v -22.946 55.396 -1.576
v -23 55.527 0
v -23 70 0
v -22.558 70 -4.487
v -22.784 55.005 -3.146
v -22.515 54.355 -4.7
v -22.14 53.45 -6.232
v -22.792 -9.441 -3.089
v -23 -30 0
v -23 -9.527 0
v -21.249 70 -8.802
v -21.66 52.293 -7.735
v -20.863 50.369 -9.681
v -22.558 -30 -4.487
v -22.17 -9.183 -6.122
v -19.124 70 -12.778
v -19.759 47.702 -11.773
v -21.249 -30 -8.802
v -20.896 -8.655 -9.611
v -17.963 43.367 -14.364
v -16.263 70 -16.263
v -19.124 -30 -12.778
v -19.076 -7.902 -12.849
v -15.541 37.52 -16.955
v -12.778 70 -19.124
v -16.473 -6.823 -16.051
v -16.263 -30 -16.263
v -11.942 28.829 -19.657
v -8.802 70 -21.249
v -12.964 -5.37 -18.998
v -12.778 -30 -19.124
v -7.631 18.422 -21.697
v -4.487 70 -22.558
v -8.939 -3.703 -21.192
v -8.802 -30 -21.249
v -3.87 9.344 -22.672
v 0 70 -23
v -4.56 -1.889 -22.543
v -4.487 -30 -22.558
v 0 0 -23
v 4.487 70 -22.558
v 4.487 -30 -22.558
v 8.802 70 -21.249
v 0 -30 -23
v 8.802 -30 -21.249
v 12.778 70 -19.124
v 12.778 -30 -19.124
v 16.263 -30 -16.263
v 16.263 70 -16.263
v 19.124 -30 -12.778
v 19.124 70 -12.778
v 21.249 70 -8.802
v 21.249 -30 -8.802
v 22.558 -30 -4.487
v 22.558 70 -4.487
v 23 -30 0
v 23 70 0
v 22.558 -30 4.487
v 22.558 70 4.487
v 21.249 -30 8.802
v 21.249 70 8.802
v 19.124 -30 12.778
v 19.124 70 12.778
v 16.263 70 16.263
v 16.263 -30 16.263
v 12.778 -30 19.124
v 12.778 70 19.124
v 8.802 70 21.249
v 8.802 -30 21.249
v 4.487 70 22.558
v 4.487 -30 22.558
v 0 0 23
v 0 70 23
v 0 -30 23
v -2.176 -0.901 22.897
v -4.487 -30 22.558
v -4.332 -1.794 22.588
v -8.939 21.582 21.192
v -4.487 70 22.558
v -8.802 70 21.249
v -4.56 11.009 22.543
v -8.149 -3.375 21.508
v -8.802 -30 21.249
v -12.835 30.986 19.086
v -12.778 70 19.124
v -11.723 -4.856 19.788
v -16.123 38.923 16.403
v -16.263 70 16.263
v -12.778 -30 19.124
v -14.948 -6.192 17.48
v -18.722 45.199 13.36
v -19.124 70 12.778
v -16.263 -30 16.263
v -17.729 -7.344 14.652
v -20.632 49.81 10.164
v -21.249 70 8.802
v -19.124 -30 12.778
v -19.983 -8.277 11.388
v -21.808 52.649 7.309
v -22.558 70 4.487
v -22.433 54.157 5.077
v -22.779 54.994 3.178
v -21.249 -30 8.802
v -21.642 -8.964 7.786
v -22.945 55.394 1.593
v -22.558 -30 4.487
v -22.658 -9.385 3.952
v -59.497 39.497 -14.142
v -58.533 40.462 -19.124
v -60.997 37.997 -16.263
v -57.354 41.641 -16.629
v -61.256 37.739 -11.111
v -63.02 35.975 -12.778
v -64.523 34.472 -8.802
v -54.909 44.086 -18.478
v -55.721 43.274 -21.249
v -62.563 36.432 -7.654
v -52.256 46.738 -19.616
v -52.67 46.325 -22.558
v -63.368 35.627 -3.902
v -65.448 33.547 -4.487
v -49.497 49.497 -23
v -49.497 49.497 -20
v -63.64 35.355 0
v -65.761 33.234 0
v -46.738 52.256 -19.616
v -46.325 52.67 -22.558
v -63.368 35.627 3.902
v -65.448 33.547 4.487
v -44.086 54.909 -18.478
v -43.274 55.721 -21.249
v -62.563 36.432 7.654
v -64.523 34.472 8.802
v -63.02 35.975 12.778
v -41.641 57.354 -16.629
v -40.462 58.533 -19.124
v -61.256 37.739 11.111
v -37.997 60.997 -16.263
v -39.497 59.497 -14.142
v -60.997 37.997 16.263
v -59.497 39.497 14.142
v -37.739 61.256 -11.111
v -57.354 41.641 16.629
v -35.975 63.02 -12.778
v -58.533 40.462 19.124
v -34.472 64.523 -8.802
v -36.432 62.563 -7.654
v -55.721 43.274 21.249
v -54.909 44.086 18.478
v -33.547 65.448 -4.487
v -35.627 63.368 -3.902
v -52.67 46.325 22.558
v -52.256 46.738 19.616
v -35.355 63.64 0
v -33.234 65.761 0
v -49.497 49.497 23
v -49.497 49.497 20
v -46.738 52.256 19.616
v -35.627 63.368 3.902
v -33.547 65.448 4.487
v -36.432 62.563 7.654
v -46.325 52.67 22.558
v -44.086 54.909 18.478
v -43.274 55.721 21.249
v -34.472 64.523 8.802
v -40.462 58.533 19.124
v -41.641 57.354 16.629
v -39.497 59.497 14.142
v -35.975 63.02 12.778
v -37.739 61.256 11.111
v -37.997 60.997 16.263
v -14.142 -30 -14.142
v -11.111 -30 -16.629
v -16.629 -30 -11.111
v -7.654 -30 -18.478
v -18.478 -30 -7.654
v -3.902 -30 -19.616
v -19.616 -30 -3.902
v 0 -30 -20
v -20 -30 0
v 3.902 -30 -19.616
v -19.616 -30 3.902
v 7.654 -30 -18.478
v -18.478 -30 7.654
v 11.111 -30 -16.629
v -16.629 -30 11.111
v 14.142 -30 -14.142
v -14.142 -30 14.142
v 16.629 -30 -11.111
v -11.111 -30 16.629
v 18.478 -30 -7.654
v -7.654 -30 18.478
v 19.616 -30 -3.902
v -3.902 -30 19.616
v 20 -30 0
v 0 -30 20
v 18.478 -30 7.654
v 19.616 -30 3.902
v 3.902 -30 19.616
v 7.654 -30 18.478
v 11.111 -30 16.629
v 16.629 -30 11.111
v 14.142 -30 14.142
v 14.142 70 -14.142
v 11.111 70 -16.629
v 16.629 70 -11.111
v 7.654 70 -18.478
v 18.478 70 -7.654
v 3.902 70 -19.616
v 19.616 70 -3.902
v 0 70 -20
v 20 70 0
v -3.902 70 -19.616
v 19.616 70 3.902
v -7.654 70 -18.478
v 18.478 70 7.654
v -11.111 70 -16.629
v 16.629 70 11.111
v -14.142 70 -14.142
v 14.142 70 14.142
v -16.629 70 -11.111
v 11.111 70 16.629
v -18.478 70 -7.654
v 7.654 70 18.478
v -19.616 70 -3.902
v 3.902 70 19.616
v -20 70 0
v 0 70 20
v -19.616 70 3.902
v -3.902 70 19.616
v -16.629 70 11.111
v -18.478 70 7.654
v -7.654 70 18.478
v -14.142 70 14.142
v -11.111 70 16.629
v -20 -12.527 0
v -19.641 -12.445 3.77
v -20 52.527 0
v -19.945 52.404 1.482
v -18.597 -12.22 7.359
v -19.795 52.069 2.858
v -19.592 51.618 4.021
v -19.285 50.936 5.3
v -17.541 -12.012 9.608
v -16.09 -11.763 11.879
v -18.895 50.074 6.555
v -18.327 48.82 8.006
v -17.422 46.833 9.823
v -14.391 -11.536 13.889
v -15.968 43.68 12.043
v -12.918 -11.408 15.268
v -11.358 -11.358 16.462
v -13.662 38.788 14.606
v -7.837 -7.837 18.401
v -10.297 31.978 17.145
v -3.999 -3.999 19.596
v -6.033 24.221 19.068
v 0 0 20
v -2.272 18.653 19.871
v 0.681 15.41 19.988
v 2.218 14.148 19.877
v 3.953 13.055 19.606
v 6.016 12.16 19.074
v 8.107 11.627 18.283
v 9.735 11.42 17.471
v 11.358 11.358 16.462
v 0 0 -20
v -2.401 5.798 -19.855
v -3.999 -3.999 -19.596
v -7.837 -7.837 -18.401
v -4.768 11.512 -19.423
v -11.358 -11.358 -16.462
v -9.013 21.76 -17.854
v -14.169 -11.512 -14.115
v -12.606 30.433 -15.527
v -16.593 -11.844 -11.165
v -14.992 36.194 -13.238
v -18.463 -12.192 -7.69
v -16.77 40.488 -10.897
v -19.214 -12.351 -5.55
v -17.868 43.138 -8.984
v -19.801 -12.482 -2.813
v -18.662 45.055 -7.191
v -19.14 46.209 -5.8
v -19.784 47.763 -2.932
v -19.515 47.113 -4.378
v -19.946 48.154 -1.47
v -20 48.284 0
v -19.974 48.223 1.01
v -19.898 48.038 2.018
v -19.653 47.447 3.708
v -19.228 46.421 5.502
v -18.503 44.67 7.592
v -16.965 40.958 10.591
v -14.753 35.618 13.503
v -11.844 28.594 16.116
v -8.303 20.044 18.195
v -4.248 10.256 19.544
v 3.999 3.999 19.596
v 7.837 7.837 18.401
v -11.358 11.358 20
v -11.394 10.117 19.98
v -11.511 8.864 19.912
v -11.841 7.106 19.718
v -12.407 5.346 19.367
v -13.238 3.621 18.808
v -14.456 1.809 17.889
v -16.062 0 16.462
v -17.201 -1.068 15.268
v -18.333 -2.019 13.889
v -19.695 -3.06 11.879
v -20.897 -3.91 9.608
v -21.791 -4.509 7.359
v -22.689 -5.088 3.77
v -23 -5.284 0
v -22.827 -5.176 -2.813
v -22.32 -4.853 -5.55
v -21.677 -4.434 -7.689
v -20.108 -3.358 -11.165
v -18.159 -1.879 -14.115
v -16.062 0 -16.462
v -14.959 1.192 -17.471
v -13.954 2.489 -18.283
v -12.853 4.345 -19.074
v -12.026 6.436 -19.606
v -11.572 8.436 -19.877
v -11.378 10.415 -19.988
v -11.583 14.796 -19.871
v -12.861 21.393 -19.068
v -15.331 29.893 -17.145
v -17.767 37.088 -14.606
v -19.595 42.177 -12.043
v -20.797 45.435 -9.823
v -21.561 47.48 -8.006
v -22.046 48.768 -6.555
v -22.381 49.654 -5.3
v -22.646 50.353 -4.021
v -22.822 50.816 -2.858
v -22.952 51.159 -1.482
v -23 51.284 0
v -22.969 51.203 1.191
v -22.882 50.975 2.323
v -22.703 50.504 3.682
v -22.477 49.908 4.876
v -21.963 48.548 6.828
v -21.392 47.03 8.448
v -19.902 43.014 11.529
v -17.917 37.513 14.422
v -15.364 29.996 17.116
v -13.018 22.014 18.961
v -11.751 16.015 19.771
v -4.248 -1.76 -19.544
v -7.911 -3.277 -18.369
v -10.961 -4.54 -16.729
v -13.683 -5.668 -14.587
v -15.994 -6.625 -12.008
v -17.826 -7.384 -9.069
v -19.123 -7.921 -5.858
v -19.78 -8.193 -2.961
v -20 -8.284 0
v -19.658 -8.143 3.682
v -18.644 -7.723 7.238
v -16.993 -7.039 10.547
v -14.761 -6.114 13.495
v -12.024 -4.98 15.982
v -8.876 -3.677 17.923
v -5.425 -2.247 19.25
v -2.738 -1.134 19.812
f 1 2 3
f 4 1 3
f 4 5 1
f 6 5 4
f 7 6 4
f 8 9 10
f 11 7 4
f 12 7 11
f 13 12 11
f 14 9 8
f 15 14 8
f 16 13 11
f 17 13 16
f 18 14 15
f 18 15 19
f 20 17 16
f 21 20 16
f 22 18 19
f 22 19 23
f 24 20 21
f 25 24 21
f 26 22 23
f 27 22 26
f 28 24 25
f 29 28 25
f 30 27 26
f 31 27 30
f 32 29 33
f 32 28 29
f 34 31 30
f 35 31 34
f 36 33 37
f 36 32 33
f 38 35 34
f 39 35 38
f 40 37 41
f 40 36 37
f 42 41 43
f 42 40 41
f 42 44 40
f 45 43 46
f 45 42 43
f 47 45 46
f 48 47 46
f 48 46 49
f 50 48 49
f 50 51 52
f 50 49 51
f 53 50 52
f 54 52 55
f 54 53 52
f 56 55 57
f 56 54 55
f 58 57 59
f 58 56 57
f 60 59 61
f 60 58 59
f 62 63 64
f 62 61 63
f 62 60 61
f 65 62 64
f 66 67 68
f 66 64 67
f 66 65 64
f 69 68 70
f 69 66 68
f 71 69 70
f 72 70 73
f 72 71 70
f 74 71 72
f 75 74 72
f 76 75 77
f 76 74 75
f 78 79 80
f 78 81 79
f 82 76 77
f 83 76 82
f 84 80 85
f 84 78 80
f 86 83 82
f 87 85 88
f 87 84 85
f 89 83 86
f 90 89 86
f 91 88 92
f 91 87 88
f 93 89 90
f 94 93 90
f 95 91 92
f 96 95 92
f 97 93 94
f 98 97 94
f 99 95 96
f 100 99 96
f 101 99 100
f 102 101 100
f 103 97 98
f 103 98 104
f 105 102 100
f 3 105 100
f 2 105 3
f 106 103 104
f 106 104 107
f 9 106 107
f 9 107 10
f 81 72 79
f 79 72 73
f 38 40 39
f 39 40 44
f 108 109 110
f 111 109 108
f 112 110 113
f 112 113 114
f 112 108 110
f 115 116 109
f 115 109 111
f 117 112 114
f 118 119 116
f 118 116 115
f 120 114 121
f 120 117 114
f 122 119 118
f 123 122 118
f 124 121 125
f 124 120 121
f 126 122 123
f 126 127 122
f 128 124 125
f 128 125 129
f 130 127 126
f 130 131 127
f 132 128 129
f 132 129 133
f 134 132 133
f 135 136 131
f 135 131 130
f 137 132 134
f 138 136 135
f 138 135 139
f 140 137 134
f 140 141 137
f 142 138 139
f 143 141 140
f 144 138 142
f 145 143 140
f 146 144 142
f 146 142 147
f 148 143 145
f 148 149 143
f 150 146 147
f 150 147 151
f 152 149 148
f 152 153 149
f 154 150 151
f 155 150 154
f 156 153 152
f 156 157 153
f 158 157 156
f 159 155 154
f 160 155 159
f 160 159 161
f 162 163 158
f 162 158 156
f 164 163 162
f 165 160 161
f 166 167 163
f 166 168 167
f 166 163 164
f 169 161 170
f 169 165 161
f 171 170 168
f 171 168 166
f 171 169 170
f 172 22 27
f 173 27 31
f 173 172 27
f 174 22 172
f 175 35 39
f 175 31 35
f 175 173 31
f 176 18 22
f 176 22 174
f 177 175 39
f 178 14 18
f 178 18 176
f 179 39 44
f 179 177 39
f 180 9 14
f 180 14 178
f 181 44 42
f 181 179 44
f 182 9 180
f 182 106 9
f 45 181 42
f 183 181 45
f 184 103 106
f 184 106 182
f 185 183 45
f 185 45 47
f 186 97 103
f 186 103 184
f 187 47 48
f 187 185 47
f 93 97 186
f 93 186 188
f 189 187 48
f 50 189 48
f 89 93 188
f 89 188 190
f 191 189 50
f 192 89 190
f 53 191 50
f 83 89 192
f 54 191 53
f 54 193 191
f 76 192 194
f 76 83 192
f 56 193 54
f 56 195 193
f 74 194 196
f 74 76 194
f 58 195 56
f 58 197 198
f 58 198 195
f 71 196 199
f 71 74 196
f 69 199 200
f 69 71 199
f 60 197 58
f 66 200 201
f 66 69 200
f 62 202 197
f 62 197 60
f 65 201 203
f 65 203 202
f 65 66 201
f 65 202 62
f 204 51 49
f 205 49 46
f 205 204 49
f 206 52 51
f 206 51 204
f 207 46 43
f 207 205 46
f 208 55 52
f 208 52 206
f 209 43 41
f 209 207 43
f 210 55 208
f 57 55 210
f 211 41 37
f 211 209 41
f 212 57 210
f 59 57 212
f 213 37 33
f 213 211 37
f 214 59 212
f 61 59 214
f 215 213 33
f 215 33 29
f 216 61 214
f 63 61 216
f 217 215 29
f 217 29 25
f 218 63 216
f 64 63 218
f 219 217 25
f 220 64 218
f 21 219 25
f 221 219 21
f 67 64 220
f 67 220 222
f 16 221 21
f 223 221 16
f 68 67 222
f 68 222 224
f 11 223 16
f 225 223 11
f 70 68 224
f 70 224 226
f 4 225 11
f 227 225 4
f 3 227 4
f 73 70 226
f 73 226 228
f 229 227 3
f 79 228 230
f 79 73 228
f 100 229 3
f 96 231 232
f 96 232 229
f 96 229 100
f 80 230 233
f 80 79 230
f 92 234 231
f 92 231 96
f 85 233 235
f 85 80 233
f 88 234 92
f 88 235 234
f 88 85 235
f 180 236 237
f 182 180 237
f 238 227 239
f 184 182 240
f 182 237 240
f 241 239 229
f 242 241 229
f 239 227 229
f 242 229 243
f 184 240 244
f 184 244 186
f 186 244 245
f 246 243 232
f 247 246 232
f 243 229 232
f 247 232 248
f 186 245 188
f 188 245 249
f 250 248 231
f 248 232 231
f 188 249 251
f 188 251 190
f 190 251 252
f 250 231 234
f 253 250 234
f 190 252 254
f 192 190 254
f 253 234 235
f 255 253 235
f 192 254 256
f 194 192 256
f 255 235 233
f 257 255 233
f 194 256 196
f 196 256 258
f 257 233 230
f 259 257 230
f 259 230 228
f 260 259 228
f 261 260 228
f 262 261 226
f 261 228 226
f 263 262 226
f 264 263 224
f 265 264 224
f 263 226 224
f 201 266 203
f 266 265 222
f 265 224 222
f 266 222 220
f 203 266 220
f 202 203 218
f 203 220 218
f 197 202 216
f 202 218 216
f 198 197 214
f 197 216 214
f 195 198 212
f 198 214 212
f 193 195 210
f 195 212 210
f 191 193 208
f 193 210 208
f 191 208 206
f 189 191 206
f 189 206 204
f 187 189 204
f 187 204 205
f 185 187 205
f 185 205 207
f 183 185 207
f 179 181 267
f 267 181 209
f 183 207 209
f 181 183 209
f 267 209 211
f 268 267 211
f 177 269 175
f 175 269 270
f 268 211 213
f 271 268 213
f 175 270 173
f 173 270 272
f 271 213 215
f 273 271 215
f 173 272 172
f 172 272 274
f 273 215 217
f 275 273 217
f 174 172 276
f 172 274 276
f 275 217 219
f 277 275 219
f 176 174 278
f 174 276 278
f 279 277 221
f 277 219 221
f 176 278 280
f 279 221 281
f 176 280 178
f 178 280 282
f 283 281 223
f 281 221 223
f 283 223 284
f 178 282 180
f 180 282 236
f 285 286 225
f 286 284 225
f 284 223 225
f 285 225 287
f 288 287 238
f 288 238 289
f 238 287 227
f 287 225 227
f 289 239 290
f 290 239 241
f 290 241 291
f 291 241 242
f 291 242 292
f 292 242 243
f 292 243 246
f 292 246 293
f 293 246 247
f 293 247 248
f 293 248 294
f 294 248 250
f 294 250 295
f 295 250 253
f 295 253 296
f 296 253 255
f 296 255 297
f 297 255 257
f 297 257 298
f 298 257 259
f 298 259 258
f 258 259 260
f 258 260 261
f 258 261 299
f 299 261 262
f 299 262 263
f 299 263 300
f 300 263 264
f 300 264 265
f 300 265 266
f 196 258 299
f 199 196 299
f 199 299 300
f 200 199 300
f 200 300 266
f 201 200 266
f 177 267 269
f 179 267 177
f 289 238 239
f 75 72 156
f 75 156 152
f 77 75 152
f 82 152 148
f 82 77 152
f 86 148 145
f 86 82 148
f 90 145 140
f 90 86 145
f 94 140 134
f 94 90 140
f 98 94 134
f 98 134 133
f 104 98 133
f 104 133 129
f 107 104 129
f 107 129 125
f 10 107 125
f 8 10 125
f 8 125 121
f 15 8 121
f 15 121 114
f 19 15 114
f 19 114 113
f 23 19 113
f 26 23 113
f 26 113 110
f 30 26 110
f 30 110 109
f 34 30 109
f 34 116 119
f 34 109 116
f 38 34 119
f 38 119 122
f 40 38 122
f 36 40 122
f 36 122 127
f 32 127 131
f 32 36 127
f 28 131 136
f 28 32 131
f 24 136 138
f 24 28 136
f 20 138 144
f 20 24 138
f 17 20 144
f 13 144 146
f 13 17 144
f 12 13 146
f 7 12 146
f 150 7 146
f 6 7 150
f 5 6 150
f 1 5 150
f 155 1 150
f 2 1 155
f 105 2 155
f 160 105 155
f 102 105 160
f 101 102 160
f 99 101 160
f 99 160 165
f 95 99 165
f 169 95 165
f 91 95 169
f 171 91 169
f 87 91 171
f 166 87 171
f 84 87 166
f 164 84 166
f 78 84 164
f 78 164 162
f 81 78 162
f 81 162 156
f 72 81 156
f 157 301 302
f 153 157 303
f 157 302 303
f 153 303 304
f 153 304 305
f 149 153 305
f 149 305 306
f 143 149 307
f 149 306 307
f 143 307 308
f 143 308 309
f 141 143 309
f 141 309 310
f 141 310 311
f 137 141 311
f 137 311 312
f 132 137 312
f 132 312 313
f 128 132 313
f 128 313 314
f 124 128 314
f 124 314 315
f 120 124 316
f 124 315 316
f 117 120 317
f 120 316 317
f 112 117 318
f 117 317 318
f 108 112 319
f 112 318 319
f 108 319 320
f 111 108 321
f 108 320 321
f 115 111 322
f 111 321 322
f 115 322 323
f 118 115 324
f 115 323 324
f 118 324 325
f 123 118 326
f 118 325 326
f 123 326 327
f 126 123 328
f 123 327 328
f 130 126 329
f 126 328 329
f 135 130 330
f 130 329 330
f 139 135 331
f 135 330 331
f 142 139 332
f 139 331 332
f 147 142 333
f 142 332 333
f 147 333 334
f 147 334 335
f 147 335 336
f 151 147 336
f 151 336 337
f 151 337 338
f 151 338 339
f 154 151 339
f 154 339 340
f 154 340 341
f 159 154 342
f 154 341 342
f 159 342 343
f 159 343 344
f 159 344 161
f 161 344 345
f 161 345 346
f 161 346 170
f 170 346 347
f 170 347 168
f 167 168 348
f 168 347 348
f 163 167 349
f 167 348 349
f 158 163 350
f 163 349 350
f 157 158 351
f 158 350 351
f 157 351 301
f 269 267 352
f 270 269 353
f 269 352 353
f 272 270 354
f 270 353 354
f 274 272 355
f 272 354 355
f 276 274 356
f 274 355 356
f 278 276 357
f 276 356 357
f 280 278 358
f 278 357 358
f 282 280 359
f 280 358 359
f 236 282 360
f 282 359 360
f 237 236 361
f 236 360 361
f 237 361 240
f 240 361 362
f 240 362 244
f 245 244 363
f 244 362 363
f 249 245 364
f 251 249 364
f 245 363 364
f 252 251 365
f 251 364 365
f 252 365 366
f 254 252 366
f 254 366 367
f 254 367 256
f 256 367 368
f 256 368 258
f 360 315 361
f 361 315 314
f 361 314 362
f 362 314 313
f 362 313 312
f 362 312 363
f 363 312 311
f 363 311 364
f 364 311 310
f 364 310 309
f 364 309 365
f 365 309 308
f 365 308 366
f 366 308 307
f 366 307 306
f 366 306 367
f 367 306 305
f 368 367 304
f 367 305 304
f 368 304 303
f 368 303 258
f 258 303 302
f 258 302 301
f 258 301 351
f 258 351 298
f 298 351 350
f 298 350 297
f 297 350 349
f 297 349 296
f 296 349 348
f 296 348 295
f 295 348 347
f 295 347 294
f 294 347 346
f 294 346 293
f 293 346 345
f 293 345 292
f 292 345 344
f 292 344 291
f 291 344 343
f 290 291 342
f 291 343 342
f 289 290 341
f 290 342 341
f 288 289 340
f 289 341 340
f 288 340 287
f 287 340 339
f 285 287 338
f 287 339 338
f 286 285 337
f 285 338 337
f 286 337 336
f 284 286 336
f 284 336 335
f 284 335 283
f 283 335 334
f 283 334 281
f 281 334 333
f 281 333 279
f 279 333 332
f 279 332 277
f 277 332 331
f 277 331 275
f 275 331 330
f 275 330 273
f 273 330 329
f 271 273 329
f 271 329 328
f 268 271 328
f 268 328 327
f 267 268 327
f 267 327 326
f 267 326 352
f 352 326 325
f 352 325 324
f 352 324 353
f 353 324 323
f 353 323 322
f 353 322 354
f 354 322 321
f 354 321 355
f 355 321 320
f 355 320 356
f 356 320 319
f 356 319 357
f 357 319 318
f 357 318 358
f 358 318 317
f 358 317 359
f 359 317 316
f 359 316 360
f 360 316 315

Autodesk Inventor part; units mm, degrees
ref_plane "YZ Plane" through (0, 0, 0) normal (1, 0, 0) x (0, 1, 0)
ref_plane "XY Plane" through (0, 0, 0) normal (0, 0, 1) x (1, 0, 0)
sketch "Sketch1" plane through (0, 0, 0) normal (0, 1, 0) x (-1, 0, 0)
  circle A0 centre (0, 0) radius 20
  circle A1 centre (0, 0) radius 23
  dimension "d0" = 40
  dimension "d1" = 46
extrude "Extrusion1" add sketch "Sketch1" along normal mid plane 140
ref_plane "Work Plane1" through (0, 0, 0) normal (-0.7071, 0.7071, 0) x (0, 0, 1)
sketch "Sketch2" plane through (0, 0, 0) normal (-0.7071, 0.7071, 0) x (0, 0, 1)
  circle A0 centre (0, 0) radius 20
  circle A1 centre (0, 0) radius 23
  dimension "d5" = 40
  dimension "d6" = 46
extrude "Extrusion2" add sketch "Sketch2" along normal blind 70
sketch "Sketch3" plane through (0, 70, 0) normal (0, 1, 0) x (1, 0, 0)
  circle A0 centre (0, 0) radius 20 projected
extrude "Extrusion3" cut sketch "Sketch3" against normal through all
sketch "Sketch4" plane through (-49.4975, 49.4975, 0) normal (-0.7071, 0.7071, 0) x (-0.7071, -0.7071, 0)
  circle A0 centre (0, 0) radius 20 projected
extrude "Extrusion4" cut sketch "Sketch4" against normal up to next
sketch "Sketch5" plane through (0, -70, 0) normal (0, -1, 0) x (1, 0, 0)
  circle A0 centre (0, 0) radius 20 projected
  circle A1 centre (0, 0) radius 23 projected
extrude "Extrusion5" cut sketch "Sketch5" against normal blind 40
properties part number "16217 - 40mm Plain PVC 45 Degree Tee" material "PVC-Piping"
